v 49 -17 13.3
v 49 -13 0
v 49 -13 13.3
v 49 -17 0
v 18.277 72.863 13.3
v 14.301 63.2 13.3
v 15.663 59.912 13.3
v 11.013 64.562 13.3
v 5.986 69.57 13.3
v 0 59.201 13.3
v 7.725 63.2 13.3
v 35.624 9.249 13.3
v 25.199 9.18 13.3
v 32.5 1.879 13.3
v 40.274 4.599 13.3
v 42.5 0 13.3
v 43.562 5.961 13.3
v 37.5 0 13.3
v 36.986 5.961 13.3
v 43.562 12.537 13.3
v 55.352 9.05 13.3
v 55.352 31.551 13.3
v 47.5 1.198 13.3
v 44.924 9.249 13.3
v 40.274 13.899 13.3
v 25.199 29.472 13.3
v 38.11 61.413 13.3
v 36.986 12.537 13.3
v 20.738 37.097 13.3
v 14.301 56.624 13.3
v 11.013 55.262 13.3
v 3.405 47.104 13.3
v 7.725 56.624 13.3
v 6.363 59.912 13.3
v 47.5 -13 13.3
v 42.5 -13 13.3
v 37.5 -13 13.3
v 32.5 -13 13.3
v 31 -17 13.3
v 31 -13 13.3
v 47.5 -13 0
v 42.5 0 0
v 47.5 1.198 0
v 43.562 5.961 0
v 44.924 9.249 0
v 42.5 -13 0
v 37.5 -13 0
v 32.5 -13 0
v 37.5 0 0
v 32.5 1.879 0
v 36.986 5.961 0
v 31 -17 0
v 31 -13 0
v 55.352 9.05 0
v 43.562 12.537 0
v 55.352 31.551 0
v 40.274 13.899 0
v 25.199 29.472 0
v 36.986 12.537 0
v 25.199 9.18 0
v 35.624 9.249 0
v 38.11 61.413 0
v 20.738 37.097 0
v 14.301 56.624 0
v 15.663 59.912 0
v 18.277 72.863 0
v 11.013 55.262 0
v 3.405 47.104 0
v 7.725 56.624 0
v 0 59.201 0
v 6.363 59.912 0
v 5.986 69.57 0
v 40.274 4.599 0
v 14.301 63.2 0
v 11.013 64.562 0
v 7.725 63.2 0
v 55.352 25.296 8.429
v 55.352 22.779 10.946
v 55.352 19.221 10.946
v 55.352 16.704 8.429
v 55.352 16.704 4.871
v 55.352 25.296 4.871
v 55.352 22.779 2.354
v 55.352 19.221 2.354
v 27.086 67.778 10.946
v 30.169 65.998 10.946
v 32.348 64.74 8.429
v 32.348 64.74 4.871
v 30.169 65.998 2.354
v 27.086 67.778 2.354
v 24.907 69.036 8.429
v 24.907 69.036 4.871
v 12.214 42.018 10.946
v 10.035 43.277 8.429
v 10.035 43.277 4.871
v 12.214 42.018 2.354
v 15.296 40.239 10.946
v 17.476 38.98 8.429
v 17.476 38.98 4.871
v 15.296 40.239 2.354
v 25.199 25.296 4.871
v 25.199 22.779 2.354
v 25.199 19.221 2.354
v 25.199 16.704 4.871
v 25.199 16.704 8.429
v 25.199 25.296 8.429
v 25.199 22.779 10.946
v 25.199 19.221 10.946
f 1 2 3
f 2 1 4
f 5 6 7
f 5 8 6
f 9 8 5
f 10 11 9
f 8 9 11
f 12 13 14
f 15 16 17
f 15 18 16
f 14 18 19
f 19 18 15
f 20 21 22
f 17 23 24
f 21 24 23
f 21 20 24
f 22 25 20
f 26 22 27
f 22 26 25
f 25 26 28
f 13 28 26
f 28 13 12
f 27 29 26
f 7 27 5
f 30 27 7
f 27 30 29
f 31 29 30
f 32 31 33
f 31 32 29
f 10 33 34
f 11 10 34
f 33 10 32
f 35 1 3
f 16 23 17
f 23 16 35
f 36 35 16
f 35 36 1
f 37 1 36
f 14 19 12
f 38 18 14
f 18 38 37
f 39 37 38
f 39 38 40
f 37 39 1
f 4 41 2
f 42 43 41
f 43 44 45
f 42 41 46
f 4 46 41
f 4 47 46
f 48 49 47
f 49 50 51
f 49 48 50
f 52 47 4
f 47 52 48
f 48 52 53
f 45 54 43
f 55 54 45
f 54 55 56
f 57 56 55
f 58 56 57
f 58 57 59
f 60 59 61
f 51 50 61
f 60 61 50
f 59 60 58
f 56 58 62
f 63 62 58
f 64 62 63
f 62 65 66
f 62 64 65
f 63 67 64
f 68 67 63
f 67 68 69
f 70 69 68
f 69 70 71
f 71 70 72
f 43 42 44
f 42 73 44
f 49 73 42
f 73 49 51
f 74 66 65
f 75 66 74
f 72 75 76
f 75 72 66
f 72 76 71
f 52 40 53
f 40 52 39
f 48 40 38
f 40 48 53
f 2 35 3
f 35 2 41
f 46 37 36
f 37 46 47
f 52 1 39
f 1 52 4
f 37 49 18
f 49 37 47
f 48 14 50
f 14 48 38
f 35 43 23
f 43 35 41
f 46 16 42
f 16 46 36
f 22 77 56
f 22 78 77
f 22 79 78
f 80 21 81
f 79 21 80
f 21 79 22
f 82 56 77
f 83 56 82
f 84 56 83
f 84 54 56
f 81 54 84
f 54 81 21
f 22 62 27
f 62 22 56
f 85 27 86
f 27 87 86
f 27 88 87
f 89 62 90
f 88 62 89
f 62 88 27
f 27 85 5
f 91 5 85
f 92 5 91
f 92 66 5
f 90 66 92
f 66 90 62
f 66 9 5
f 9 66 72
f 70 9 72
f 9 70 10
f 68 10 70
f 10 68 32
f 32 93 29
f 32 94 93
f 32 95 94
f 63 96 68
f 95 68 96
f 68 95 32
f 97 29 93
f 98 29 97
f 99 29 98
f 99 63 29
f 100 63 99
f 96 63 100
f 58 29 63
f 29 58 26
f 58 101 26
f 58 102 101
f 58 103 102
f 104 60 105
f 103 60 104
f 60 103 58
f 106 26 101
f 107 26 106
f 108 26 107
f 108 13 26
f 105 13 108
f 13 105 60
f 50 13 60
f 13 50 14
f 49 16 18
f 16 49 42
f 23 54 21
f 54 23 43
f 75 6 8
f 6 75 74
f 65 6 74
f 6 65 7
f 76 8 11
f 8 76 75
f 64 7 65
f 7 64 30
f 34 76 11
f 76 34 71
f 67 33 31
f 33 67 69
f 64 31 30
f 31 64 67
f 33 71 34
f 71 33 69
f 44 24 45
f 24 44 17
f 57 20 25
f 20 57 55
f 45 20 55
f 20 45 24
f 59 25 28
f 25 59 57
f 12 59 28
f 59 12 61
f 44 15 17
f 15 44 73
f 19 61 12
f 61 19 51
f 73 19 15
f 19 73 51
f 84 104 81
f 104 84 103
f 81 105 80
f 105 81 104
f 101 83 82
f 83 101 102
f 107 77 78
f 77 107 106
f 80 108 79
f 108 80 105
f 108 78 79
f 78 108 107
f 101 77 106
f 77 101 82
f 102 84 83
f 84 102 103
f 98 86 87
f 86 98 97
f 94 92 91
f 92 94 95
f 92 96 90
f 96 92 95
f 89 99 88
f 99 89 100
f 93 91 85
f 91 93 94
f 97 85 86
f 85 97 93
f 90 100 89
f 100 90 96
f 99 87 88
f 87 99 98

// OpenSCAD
// file: configuration.scad
// PRUSA Mendel  
// Configuration file
// GNU GPL v2
// Josef Průša
// josefprusa@me.com
// prusadjs.cz
// http://www.reprap.org/wiki/Prusa_Mendel
// http://github.com/prusajr/PrusaMendel

// M8 rod diameter
m8_diameter = 8.4;

// M8 nut diameter diameter
// Used for $fn nut trick -> cylinder(h = 5, r=4.5, $fn=6, center=true);
m8_nut_diameter = 16.4;

// M4 rod/screw diameter
m4_diameter = 5;

// M4 nut diameter diameter
// Used for $fn nut trick -> cylinder(h = 5, r=4.5, $fn=6, center=true);
m4_nut_diameter = 9;

// M3 rod/screw diameter
m3_diameter = 4.4;

// M3 nut diameter diameter
// Used for $fn nut trick -> cylinder(h = 5, r=4.5, $fn=6, center=true);
m3_nut_diameter = 7;

// Bushing holders diameter
bushing_diameter = 11;
// main file
// PRUSA Mendel  
// Frame vertex
// GNU GPL v2
// Josef Průša
// josefprusa@me.com
// prusadjs.cz
// http://www.reprap.org/wiki/Prusa_Mendel
// http://github.com/prusajr/PrusaMendel

// Based on http://www.thingiverse.com/thing:2003 aka Viks footed 
// frame vertex, which is based on http://www.thingiverse.com/thing:1780 
// aka Tonokps parametric frame vertex
// Thank you guys for your great work

include <configuration.scad>

M8=m8_diameter+0.9;
vertex_height=M8+4;
with_foot=1;		// Comment out for no foot.
FN=8;

translate ([0,0,vertex_height/2])difference() 
{
	union () {
		dxf_linear_extrude(file = "vertex-body-fixed-qcad.dxf",height=vertex_height,center=true);
		//import_stl("vertex-body-fixed.stl");
		if (with_foot==1) {
			translate([40,-15,0]) vertex_foot();
		}
	}

	translate([11.013,59.912]) zhole(M8); 
	//translate([35.013,39.999,0]) zhole(M8); 
	translate([40.274,9.249,0]) zhole(M8); 
	//translate([40.217,30.992]) zhole(M3); 
	//translate([29.829,48.986]) zhole(M3); 
	translate([0,21,0]) 
		xteardrop(M8,200);
	translate([13.687,41.010,0]) rotate(a=60,v=[0,0,1])
		xteardrop(M8,200);
}


module zhole(diameter) cylinder(h=100,r=(diameter/2),center=true,$fn=FN); 

module xteardrop(diameter,length) rotate(a=-90,v=[0,1,0]) rotate(a=-90,v=[0,0,1]) zteardrop(diameter,length);

module yteardrop(diameter,length) rotate(a=90,v=[1,0,0]) zteardrop(diameter,length);

module zteardrop(diameter,height)
{
	rotate(a=0, v=[0,0,1]) union()
	{
		//translate([0,0,-height/2]) cube(size=[diameter/2,diameter/2,height],center=false);
		rotate(a=22.5, v=[0,0,1])cylinder(r=diameter/2, h = height,center=true,$fn=FN);
	}
}

module vertex_foot() {
	difference () {
		union () {
			cube([18,4,vertex_height],center=true);
			translate ([-5,8,0]) cube([5,18,vertex_height],center=true);
			translate ([5,9,0]) cube([5,18,vertex_height],center=true);
		}
		//translate ([0,8,0]) xteardrop(7,200);
	}
}
